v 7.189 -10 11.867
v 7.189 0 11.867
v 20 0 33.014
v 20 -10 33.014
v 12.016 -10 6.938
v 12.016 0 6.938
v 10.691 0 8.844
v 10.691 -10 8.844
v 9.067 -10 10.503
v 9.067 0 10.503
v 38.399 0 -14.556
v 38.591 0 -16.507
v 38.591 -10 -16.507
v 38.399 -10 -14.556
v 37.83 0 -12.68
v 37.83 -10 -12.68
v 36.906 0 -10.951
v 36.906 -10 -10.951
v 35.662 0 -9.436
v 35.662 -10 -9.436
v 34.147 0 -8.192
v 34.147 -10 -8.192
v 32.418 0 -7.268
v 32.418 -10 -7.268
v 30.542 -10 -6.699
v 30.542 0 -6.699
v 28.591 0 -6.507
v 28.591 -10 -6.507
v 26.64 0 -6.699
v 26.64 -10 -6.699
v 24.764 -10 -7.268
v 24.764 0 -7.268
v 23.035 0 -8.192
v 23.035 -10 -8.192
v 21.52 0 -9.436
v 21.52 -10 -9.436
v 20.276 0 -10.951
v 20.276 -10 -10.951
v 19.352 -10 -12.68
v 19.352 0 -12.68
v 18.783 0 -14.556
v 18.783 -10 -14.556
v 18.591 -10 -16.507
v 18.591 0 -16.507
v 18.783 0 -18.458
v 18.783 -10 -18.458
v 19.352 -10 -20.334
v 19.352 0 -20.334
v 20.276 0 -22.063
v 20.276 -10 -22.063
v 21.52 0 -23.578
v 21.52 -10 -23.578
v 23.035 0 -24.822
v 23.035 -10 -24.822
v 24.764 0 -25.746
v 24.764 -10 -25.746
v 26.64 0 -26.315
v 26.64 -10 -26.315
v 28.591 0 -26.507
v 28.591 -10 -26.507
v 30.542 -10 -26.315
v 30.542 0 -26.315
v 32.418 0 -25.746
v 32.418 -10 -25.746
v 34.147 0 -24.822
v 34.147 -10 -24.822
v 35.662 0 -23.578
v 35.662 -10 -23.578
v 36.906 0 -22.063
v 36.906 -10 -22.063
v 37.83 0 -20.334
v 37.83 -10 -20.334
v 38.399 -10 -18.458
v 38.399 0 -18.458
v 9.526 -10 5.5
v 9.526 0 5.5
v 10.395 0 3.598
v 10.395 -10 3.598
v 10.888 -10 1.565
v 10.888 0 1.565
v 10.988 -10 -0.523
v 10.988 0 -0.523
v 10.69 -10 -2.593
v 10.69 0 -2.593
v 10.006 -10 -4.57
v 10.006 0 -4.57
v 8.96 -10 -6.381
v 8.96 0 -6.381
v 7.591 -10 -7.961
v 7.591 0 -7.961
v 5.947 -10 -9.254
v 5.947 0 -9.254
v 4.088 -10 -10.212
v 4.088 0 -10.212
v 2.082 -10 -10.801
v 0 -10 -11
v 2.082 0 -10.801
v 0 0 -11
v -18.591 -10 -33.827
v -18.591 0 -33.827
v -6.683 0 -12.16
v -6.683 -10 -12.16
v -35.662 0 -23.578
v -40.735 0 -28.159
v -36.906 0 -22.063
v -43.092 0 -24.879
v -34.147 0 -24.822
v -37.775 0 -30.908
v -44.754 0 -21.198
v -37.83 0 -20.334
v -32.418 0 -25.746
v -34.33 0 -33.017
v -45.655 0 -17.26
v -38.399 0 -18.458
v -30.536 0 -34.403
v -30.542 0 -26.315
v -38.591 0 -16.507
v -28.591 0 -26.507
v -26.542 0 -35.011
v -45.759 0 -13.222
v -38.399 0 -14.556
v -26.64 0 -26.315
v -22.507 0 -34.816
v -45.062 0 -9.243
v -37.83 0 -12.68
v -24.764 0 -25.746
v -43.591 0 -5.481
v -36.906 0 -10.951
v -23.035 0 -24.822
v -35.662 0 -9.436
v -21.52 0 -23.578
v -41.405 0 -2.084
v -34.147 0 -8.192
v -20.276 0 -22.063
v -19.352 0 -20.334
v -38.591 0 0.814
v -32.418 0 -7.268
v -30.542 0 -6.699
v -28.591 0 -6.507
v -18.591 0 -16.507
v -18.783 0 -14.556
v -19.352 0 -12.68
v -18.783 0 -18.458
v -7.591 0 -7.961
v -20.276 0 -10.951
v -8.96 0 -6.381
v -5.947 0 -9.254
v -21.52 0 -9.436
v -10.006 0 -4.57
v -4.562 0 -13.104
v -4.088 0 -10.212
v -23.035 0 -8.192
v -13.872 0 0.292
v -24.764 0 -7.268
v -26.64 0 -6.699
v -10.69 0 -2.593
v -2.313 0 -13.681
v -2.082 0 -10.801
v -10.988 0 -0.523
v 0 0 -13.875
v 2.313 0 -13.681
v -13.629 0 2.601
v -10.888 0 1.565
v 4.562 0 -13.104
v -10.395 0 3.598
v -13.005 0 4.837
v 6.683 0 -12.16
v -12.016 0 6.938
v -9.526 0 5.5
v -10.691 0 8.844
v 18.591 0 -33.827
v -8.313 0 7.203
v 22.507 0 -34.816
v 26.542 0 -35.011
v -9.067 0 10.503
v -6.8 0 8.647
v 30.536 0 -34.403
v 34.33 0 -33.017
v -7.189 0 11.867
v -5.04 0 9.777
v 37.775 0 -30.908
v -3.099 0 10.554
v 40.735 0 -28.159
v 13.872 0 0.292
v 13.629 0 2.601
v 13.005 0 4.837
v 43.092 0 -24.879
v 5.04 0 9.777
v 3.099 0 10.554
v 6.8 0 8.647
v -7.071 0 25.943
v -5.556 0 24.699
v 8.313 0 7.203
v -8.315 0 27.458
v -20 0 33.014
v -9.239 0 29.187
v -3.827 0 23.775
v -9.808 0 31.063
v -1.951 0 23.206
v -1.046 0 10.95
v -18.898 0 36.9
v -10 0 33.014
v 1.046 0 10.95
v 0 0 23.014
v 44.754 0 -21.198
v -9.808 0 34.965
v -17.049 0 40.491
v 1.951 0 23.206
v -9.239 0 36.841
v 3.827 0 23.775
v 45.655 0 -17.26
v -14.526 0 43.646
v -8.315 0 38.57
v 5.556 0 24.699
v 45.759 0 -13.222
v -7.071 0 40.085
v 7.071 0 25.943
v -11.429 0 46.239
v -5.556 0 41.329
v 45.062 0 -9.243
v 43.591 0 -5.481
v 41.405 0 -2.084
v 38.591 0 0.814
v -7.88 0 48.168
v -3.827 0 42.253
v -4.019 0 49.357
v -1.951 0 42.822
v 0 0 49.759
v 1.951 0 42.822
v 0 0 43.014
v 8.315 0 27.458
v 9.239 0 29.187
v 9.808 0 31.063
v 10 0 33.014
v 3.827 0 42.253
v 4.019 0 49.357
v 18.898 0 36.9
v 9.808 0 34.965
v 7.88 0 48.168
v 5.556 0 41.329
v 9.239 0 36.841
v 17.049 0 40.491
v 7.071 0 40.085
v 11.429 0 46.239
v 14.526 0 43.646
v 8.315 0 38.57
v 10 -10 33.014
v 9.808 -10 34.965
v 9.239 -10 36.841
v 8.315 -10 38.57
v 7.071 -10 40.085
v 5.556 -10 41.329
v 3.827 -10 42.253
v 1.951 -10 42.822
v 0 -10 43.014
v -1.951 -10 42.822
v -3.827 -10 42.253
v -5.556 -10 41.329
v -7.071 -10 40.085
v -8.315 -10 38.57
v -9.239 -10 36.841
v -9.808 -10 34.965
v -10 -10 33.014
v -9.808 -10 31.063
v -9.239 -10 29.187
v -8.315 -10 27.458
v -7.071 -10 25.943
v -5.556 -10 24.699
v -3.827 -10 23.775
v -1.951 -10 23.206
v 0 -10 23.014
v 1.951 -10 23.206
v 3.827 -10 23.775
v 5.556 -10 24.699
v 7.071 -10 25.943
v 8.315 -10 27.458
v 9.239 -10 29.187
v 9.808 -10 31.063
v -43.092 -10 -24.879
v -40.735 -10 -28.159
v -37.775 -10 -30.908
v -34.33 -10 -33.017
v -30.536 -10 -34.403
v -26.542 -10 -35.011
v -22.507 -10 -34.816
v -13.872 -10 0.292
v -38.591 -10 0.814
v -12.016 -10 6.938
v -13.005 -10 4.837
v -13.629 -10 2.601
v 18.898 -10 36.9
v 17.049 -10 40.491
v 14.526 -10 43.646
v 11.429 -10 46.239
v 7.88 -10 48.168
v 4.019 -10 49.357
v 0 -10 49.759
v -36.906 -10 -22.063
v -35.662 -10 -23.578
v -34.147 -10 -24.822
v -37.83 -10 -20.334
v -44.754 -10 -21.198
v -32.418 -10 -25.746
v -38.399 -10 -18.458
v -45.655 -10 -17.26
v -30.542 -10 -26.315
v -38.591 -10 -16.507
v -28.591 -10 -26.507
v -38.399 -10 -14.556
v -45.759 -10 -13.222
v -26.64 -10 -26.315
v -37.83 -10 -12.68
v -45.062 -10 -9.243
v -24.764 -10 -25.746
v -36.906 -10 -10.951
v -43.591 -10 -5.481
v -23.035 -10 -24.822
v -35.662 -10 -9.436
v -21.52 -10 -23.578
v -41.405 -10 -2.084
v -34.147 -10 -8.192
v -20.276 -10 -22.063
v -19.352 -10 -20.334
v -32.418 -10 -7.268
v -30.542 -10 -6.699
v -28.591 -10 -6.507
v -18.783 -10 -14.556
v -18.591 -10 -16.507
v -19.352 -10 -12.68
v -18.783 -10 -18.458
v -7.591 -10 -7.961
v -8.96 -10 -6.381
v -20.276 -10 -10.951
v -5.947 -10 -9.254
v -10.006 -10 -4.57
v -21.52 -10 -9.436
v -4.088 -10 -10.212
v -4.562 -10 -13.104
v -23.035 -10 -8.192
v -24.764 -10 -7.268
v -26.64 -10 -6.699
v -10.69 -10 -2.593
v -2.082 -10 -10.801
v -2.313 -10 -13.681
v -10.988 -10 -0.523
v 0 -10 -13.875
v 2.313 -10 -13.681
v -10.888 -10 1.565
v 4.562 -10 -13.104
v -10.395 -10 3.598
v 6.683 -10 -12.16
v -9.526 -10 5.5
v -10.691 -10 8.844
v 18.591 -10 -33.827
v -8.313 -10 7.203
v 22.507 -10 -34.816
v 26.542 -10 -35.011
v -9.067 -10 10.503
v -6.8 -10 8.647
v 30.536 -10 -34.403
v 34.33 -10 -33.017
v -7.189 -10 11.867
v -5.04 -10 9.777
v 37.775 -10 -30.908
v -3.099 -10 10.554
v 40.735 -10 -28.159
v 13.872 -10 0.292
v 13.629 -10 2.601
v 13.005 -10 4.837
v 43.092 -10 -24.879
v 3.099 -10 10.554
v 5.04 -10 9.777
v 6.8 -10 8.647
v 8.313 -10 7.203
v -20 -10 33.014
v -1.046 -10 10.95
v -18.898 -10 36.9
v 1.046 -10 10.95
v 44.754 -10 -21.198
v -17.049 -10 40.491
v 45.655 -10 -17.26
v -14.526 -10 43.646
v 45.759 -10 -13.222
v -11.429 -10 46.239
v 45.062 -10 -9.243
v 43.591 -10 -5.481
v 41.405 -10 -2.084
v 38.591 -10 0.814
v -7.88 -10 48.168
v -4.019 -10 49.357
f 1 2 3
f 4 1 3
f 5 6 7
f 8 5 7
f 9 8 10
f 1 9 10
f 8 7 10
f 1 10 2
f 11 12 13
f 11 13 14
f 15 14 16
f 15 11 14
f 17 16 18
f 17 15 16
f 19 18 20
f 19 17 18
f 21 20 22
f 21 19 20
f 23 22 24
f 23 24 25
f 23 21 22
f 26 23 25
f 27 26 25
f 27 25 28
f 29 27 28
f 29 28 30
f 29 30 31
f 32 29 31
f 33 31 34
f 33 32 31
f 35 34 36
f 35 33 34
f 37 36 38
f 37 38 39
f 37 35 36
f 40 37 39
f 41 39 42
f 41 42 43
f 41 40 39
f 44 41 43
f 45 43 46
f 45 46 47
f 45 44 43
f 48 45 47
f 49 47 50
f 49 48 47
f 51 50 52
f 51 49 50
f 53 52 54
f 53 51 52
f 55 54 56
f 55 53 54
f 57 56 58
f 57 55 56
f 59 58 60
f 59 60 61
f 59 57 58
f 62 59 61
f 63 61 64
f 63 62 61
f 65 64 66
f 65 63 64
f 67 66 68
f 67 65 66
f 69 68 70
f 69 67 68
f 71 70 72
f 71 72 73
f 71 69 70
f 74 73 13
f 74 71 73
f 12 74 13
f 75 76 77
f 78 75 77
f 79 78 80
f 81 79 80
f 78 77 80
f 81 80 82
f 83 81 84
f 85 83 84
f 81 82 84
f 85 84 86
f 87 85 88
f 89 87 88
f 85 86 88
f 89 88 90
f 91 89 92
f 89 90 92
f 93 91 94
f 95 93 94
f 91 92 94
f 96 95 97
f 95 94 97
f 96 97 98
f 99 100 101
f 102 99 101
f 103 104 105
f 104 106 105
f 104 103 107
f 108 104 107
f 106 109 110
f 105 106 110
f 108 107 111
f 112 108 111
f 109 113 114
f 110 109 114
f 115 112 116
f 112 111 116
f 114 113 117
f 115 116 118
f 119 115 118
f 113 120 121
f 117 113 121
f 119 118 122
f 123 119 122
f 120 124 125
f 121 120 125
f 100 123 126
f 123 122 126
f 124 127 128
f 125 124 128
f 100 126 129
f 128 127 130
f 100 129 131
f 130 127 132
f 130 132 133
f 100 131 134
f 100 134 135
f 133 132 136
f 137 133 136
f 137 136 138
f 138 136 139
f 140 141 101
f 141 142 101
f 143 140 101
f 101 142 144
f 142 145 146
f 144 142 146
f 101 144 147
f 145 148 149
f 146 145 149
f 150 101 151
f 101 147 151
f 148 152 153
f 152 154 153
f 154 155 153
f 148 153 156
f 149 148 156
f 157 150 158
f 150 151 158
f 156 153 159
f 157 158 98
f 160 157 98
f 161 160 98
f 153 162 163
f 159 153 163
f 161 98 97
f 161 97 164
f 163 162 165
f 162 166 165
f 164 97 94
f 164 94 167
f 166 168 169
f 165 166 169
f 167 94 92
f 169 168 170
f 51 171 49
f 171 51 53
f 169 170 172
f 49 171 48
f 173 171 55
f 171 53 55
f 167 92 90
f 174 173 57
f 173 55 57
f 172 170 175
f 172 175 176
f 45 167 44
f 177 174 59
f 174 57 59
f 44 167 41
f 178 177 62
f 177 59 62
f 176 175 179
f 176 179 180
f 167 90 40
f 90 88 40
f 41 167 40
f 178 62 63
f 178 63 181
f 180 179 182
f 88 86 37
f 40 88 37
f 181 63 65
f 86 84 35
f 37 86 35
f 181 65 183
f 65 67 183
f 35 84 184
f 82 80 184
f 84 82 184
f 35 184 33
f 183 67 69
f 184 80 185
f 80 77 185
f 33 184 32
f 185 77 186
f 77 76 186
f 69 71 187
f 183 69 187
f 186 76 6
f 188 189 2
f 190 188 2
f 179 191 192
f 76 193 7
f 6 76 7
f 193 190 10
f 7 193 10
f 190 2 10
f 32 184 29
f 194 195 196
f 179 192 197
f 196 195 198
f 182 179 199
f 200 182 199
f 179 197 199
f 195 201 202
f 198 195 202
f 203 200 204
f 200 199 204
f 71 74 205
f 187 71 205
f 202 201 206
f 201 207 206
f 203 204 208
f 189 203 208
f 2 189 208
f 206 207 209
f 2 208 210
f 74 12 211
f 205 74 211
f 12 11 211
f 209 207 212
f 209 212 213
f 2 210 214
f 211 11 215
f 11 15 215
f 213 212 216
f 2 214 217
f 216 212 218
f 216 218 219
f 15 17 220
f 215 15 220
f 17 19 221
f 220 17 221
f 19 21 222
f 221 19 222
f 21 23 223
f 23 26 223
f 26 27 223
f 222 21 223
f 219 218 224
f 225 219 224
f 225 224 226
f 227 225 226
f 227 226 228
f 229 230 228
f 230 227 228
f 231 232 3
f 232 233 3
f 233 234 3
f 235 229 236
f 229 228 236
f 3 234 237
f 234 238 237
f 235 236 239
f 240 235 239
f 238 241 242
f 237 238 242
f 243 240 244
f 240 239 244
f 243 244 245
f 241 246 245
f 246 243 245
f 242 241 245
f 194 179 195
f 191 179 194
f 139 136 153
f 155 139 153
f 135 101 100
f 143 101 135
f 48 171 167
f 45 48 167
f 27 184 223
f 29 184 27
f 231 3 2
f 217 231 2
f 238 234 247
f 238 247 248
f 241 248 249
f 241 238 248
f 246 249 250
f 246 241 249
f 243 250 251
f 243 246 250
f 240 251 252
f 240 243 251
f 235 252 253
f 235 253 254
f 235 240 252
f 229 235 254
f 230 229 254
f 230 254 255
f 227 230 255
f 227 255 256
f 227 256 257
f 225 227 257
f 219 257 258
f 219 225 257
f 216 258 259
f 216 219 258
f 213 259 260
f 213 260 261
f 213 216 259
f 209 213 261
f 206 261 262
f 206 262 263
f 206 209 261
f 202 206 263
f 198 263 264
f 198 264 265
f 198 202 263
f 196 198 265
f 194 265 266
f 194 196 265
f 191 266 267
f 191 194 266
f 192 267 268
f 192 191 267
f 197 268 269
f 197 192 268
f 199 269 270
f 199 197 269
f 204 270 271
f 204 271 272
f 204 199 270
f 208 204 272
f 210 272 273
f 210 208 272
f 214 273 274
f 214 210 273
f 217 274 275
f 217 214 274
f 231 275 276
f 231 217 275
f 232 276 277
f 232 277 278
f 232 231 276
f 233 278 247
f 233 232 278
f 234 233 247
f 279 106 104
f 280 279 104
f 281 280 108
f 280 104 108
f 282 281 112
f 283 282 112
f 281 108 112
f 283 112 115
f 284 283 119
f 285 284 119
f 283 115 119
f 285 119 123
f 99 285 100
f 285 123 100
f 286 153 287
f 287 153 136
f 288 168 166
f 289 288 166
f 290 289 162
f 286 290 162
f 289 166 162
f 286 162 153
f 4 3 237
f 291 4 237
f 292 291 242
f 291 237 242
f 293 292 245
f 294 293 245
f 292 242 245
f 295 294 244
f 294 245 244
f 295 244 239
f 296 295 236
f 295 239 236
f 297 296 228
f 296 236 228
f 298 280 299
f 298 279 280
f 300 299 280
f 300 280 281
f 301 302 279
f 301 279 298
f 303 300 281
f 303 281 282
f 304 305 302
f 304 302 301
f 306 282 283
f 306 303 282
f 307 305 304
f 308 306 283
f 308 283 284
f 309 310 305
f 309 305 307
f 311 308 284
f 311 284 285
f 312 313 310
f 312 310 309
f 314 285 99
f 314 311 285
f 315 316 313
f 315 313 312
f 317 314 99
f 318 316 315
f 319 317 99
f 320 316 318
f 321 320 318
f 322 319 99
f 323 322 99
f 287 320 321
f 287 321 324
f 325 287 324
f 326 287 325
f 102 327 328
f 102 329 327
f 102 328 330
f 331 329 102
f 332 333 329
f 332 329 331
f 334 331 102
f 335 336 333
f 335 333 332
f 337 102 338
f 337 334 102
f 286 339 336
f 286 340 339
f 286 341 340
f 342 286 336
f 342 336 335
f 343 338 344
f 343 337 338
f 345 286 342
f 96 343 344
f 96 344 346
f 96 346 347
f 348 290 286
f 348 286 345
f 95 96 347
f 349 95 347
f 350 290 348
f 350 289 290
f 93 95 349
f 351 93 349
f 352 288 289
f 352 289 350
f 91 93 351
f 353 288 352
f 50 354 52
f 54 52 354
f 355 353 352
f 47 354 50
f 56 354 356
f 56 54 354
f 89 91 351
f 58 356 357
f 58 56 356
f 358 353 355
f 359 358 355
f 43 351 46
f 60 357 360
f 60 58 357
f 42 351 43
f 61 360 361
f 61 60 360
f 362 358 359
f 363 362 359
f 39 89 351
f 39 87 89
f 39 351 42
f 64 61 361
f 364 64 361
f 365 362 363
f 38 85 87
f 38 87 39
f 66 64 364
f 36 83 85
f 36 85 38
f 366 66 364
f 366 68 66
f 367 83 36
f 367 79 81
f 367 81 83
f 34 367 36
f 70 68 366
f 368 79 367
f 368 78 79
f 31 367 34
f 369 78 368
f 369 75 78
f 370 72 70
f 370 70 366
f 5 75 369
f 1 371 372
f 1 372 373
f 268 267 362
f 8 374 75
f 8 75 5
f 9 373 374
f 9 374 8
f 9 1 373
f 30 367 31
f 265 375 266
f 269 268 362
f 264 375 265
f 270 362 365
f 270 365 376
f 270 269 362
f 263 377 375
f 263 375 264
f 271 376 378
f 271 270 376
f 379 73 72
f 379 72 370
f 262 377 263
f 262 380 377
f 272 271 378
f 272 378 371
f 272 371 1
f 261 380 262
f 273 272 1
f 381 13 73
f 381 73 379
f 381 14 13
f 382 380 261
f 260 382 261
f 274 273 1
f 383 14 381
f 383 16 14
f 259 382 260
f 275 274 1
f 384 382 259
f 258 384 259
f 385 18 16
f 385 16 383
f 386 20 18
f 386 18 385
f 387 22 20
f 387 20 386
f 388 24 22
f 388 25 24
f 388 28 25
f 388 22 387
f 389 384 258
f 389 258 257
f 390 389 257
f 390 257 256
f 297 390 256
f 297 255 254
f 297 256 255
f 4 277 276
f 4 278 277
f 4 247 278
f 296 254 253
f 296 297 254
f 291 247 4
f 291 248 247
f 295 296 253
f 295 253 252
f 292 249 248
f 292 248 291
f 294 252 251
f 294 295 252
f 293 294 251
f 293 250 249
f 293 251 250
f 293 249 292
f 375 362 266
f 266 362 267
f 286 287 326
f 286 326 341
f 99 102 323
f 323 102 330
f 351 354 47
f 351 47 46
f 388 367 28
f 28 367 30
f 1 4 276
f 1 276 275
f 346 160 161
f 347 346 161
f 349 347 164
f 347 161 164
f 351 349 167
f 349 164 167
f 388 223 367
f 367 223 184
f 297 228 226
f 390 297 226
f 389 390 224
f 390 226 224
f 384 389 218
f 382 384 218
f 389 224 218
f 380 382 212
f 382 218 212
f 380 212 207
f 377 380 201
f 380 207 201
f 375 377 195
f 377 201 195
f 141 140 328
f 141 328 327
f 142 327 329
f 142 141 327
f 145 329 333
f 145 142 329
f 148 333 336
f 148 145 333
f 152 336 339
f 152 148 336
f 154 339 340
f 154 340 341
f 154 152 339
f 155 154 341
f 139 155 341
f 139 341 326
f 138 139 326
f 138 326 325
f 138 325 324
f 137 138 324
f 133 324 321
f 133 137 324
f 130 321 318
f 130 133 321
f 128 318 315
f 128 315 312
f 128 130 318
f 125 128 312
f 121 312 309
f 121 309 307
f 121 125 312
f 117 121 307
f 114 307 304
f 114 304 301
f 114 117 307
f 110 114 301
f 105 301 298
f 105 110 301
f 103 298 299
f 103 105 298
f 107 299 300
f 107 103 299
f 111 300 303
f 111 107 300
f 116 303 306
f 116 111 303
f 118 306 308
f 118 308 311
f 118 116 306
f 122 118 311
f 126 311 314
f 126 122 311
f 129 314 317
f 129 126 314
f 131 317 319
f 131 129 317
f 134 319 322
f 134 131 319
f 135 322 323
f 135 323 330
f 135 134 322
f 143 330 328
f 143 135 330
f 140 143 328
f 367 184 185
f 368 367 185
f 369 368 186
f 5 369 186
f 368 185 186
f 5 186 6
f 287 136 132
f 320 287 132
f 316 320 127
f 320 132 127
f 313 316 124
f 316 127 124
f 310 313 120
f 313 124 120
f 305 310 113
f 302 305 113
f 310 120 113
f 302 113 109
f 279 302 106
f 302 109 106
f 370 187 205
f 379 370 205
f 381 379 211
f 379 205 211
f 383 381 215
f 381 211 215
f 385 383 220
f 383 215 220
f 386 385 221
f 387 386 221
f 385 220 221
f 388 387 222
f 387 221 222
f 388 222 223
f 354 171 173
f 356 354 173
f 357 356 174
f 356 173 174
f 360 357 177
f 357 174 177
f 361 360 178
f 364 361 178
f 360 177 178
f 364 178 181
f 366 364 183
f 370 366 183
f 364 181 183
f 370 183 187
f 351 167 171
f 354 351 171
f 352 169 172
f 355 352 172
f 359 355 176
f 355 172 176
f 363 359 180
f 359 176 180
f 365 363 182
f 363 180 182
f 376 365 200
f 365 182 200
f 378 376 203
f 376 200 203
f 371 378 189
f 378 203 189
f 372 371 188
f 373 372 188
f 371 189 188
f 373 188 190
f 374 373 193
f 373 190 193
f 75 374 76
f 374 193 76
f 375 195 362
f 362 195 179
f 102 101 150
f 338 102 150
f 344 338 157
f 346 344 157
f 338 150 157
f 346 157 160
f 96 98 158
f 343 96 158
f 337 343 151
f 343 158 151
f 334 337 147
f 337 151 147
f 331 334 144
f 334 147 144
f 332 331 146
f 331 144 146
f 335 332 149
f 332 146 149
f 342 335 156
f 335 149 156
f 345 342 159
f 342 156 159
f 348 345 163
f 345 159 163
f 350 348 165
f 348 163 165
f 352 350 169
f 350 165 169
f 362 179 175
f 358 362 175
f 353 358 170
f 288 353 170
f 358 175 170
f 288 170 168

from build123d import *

# Parameters (mm, degrees)
F0_R     = 10
F1_DEPTH = 10


with BuildPart() as f1:
    # F0 (on Front) → F1 (new body)
    with BuildSketch(Plane.XZ):
        with BuildLine():
            Line((-20, 33.013921), (-7.189306, 11.86736))
            ThreePointArc((-7.189306, 11.86736), (-9.914082, 9.707283), (-12.01625, 6.937585))
            ThreePointArc((-12.01625, 6.937585), (-13.363794, 3.732205), (-13.872088, 0.292442))
            Line((-13.872088, 0.292442), (-38.590894, 0.813547))
            ThreePointArc((-38.590894, 0.813547), (-45.509288, -11.215099), (-43.092199, -24.879293))
            ThreePointArc((-43.092199, -24.879293), (-32.467205, -33.80465), (-18.590894, -33.827469))
            Line((-18.590894, -33.827469), (-6.682782, -12.159802))
            ThreePointArc((-6.682782, -12.159802), (-3.449712, -13.439488), (0, -13.87517))
            ThreePointArc((0, -13.87517), (3.449712, -13.439488), (6.682782, -12.159802))
            Line((6.682782, -12.159802), (18.590894, -33.827469))
            ThreePointArc((18.590894, -33.827469), (32.467205, -33.80465), (43.092199, -24.879293))
            ThreePointArc((43.092199, -24.879293), (45.509288, -11.215099), (38.590894, 0.813547))
            Line((38.590894, 0.813547), (13.872088, 0.292442))
            ThreePointArc((13.872088, 0.292442), (13.363794, 3.732205), (12.01625, 6.937585))
            ThreePointArc((12.01625, 6.937585), (9.914082, 9.707283), (7.189306, 11.86736))
            Line((7.189306, 11.86736), (20, 33.013921))
            ThreePointArc((20, 33.013921), (13.042084, 45.019749), (0, 49.758585))
            ThreePointArc((0, 49.758585), (-13.042084, 45.019749), (-20, 33.013921))
        make_face()
        with Locations((-28.590894, -16.506961)):
            Circle(F0_R, mode=Mode.SUBTRACT)
        with Locations((28.590894, -16.506961)):
            Circle(F0_R, mode=Mode.SUBTRACT)
        with BuildLine():
            ThreePointArc((-9.526279, 5.5), (0, 11), (9.526279, 5.5))
            ThreePointArc((9.526279, 5.5), (9.526279, -5.5), (0, -11))
            ThreePointArc((0, -11), (-9.526279, -5.5), (-9.526279, 5.5))
        make_face(mode=Mode.SUBTRACT)
        with Locations((0, 33.013921)):
            Circle(F0_R, mode=Mode.SUBTRACT)
    extrude(amount=F1_DEPTH)


solid = f1.part
